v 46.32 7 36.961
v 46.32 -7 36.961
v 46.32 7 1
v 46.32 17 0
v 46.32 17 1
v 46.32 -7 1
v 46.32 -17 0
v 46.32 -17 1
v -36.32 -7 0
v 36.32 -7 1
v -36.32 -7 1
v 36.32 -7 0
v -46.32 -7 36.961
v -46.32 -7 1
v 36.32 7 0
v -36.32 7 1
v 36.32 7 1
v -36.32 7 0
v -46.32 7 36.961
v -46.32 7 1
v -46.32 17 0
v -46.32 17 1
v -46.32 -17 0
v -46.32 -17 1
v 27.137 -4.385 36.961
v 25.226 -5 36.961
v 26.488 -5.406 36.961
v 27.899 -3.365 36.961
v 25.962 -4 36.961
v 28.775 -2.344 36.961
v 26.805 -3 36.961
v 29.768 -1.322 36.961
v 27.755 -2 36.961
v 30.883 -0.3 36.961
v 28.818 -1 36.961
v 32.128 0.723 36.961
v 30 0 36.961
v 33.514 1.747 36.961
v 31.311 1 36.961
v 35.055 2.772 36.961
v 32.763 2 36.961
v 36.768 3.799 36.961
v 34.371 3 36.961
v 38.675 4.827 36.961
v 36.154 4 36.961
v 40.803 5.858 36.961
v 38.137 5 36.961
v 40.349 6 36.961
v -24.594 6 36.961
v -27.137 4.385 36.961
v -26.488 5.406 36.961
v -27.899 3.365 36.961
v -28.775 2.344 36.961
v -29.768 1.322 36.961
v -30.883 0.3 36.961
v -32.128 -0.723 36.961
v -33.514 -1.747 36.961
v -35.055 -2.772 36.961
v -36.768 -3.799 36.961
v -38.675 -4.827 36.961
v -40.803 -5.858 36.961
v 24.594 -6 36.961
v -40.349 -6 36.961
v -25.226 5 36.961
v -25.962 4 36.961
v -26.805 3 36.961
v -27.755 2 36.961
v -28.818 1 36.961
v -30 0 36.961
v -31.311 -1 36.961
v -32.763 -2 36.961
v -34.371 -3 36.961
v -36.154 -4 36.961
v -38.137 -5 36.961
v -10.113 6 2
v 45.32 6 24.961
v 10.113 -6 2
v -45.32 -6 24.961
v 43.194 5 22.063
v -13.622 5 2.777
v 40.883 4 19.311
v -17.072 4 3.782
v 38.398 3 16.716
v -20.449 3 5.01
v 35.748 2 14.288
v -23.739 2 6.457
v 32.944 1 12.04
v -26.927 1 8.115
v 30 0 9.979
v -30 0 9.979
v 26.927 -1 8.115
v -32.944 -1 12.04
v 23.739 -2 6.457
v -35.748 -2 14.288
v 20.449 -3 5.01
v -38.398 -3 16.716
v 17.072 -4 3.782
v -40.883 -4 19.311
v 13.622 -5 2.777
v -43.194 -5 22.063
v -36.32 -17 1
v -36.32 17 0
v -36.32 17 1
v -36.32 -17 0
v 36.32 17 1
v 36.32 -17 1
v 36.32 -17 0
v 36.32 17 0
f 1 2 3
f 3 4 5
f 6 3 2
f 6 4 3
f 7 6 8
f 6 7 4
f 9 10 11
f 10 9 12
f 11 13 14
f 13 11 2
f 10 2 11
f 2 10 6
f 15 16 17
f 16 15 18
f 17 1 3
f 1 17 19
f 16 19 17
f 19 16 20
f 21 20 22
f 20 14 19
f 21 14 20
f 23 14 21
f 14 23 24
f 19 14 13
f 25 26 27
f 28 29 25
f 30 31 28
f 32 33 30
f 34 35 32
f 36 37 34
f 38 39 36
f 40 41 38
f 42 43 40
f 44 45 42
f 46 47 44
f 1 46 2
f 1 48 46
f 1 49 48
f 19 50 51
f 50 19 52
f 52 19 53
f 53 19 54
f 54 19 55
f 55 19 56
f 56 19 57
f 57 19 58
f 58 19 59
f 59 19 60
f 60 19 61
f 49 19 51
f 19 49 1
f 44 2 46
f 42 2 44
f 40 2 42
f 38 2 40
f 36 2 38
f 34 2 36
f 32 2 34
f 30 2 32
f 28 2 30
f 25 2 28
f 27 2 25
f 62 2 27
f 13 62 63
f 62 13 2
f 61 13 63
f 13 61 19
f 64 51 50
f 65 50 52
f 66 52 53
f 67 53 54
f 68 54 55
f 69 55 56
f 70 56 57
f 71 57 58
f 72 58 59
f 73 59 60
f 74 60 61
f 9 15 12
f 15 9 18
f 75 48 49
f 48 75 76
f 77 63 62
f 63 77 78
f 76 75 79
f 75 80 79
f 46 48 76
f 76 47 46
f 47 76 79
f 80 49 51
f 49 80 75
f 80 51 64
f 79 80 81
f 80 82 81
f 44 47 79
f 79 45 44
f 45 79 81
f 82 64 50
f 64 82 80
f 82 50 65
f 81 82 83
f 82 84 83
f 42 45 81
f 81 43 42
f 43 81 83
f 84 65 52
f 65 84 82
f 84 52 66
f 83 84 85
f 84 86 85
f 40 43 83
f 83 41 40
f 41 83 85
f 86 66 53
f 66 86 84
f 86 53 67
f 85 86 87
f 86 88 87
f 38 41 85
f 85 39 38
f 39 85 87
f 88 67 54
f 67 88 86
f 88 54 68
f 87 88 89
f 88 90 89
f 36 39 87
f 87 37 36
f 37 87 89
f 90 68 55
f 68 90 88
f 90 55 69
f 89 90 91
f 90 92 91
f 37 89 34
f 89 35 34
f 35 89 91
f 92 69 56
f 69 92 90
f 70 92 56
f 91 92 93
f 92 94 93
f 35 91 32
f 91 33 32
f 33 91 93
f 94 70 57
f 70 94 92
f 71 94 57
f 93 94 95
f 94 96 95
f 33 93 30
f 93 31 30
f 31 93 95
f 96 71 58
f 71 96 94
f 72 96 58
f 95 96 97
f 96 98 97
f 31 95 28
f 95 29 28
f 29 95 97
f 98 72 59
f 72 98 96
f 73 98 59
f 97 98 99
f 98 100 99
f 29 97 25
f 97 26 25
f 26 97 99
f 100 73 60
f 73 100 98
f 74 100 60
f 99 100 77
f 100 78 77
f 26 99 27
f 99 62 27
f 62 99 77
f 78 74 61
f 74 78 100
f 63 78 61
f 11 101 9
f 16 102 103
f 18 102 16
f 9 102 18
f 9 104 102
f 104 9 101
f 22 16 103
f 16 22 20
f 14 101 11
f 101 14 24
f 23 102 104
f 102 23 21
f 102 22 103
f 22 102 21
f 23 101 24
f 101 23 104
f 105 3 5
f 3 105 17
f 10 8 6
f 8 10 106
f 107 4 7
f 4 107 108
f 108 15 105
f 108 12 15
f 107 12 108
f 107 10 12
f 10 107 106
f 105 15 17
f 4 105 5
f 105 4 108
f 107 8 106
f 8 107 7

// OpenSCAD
// of cards
number = 24;

feetSize = 10;
feetWidth = 10;

// of card
height = 92;

// of card
width = 60;

// angle
fan = 45;

// beyond necessity
boxExtension = 10;

module cardHolder() {
    translate([0,0,fannedHeight/2])
    rotate([90,0,0])
    difference() {
        translate ([-(fannedWidth+2)/2,-fannedHeight/2,-(number/2+2)/2])
        cube ([fannedWidth+2,box,number/2+2]);
        translate([0,2,0])
        linear_extrude(center=true, height=number/2 ,twist=fan, slices=number/2)
        rotate([0,0,fan/2])
        square ([width,height],center=true);
    }
    translate([-(fannedWidth+2)/2,-(number/2+2+feetSize*2)/2,0])
    cube([feetWidth,number/2+2+feetSize*2,1]);
    translate([(fannedWidth+2)/2-feetWidth,-(number/2+2+feetSize*2)/2,0])
    cube([feetWidth,number/2+2+feetSize*2,1]);
}

module cards() {
    translate([0,0,fannedHeight/2])
    rotate([90,0,0])
    translate([0,2,0])
    linear_extrude(center=true, height=number/2 ,twist=fan, slices=100)
    rotate([0,0,fan/2])
    square ([width,height],center=true);
    
}
$fn=90;

// ; height
box = (width*sin(fan/2)+4)+boxExtension;
fannedWidth = width*cos(fan/2)+height*sin(fan/2);
fannedHeight = width*sin(fan/2)+height*cos(fan/2);

cardHolder();
%cards();
